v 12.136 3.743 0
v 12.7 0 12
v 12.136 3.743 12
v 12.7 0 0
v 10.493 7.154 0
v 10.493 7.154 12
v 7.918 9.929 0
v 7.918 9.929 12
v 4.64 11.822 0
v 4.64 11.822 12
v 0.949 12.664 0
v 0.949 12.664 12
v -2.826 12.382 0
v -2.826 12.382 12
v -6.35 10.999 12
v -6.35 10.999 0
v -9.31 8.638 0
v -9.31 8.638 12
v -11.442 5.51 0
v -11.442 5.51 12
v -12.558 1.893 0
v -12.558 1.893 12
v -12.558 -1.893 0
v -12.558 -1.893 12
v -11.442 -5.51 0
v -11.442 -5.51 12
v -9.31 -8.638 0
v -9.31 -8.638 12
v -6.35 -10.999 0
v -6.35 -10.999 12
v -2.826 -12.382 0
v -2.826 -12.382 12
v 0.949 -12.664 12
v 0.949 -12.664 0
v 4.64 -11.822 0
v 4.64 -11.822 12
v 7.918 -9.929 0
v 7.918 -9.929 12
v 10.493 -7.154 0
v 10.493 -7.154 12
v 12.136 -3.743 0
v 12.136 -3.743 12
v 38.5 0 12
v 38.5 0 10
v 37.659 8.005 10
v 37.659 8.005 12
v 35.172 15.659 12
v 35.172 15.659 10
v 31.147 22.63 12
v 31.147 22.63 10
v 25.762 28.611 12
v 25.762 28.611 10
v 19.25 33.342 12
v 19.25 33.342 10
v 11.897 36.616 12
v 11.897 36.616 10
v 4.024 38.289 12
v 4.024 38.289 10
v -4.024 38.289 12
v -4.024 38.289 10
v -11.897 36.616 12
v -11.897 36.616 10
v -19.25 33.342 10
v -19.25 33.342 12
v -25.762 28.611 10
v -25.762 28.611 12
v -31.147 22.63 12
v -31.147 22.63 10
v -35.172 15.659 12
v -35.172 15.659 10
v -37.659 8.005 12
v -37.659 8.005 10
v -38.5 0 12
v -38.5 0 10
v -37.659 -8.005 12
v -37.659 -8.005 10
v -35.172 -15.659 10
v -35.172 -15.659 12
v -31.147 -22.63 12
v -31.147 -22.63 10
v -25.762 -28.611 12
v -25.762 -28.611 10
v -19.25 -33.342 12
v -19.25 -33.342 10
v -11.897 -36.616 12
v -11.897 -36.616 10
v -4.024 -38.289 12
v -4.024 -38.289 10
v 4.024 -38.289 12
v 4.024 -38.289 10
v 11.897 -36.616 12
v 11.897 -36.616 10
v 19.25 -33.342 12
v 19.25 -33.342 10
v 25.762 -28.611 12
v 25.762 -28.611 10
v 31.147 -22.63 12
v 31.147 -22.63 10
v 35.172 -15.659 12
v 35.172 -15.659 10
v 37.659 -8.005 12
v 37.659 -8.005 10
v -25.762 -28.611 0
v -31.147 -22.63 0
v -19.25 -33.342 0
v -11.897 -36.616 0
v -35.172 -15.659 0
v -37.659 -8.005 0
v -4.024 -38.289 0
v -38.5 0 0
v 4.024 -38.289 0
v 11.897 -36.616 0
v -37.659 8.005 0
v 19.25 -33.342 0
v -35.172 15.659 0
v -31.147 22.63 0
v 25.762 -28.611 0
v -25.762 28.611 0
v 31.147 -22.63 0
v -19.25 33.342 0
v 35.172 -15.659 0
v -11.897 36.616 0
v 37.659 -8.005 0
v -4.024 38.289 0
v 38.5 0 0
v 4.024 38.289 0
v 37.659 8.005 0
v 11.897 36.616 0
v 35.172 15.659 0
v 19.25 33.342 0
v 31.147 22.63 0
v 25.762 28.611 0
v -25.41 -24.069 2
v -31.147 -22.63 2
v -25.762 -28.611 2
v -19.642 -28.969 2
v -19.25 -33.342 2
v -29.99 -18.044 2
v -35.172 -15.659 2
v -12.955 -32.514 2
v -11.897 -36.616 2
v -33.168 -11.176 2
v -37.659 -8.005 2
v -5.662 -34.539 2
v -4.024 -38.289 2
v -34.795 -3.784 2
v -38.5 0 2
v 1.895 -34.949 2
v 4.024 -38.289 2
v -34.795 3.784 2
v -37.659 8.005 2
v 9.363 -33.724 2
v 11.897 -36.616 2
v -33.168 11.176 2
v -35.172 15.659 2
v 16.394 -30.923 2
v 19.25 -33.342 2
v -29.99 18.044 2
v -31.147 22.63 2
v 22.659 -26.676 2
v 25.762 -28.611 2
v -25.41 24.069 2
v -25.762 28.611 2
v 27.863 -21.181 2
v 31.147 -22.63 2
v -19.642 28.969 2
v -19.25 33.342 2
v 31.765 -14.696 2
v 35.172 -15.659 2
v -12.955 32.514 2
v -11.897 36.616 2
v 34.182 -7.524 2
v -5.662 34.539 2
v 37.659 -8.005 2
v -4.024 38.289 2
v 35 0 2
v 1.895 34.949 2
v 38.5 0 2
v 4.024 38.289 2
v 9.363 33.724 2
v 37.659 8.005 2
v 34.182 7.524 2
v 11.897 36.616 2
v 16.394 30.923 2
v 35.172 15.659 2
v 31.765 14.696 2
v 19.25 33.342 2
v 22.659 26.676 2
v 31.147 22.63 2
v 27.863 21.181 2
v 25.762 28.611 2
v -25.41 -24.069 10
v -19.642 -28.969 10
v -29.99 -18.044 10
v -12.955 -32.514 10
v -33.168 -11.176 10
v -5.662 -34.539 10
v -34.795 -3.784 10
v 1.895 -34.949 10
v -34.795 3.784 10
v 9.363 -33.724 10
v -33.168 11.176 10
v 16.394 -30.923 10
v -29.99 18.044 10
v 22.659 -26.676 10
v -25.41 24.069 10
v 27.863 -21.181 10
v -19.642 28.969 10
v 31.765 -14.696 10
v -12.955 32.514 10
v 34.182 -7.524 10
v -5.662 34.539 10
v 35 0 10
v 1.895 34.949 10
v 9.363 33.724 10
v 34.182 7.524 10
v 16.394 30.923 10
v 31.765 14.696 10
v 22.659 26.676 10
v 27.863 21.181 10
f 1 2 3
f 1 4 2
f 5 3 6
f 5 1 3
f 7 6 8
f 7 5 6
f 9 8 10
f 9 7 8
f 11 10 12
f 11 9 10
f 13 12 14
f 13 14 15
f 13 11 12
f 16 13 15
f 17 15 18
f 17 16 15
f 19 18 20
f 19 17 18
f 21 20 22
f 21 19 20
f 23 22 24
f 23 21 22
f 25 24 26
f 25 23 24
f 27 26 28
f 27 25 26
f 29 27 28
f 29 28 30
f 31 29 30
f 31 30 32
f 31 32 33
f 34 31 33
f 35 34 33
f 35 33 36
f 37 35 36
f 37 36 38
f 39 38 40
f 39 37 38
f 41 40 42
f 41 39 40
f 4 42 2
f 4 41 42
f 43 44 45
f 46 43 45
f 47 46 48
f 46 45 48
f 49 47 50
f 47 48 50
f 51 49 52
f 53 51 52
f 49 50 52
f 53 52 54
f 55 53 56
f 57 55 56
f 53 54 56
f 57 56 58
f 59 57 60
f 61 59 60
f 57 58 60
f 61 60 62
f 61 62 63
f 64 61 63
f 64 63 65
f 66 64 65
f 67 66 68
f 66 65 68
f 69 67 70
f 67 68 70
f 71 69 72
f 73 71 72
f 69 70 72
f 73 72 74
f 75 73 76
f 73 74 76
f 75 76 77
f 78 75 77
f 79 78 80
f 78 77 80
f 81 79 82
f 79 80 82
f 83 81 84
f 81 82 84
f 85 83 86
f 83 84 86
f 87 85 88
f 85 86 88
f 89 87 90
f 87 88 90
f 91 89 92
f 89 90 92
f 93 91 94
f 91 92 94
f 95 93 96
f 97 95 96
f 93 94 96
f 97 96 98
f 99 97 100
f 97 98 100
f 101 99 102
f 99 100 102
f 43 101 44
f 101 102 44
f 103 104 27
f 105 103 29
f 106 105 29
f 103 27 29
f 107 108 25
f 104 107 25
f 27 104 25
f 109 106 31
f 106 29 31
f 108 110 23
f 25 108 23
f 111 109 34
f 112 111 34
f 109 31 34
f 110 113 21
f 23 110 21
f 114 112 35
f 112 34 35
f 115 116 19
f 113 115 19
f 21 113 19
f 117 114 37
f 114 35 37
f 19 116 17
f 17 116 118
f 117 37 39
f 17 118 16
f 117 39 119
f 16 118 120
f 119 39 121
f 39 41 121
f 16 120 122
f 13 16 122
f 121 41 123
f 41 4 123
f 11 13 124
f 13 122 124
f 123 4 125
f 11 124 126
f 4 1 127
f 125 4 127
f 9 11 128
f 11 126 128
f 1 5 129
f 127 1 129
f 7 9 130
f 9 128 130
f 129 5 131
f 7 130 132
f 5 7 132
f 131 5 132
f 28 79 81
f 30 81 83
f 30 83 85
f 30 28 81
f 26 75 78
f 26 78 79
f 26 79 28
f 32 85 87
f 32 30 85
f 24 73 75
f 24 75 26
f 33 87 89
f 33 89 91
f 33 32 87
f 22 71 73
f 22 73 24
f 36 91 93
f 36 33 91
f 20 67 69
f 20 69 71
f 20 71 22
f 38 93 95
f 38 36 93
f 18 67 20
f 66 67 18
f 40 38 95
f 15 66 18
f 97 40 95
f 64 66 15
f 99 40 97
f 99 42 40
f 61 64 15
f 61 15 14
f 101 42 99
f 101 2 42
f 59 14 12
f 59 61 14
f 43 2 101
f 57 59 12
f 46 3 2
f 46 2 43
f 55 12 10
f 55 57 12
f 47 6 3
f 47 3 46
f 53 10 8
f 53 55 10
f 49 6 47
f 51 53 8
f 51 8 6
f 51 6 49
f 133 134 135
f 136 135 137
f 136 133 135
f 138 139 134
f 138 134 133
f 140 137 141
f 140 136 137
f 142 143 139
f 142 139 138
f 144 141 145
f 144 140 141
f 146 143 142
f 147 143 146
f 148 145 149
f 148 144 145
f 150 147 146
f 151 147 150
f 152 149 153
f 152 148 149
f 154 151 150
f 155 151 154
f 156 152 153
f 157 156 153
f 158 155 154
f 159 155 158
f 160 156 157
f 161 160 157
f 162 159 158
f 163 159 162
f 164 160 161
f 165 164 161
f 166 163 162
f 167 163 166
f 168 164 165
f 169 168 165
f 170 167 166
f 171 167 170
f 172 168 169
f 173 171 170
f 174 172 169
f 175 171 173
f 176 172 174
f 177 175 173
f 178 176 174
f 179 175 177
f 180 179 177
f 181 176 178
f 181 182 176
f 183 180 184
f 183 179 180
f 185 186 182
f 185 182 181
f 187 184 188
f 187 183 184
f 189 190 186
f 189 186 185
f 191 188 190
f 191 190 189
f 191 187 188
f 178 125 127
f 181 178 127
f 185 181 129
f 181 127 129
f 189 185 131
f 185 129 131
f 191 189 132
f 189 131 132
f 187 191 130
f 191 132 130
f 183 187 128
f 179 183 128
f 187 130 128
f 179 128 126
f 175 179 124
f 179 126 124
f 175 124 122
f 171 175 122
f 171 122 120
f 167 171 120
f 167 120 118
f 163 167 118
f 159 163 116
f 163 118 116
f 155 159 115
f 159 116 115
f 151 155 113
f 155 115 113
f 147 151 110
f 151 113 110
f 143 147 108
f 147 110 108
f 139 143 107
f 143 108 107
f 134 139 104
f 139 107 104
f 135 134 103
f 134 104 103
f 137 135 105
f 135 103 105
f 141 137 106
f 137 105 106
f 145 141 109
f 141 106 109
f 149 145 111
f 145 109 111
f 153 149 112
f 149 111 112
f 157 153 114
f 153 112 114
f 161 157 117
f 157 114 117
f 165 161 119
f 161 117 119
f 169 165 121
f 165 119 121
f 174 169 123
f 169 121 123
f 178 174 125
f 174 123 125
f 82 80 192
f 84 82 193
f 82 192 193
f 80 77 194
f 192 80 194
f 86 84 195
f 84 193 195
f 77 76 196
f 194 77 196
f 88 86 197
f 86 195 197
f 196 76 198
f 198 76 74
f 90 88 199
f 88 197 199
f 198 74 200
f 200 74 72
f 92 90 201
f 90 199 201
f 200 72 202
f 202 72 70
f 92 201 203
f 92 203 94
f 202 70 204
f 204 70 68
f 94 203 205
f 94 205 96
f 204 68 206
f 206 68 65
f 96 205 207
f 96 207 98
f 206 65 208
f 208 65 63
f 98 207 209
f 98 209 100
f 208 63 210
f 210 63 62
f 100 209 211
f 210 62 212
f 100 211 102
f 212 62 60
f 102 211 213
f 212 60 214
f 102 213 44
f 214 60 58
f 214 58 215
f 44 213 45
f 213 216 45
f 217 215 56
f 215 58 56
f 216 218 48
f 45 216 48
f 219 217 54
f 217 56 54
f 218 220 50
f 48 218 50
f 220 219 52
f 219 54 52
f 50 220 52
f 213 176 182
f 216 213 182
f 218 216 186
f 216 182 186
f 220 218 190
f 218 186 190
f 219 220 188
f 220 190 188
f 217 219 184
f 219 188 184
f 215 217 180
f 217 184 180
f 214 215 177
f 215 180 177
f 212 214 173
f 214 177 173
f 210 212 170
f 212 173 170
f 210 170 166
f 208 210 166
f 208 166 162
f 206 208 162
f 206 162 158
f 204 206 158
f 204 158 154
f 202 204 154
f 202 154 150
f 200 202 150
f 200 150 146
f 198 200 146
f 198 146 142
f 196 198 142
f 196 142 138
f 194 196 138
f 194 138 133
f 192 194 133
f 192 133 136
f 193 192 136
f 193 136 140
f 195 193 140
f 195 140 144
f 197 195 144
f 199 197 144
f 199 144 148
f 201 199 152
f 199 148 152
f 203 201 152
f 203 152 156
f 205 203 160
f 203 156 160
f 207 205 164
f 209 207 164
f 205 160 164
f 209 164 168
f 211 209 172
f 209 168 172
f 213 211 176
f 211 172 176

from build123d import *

# Parameters (mm, degrees)
F0_R     = 38.5
F0_R_2   = 35
F0_R_3   = 12.7
F1_DEPTH = 2
F2_DEPTH = 10
F3_R     = 38.5
F3_R_2   = 35
F3_R_3   = 12.7
F4_DEPTH = 2


with BuildPart() as f1:
    # F0 (on Top) → F1 (new body)
    with BuildSketch(Plane.XY):
        Circle(F0_R)
        Circle(F0_R_2, mode=Mode.SUBTRACT)
        Circle(F0_R_2)
        Circle(F0_R_3, mode=Mode.SUBTRACT)
    extrude(amount=F1_DEPTH)

    # F0 (on Top) → F2 (join)
    with BuildSketch(Plane.XY):
        Circle(F0_R_2)
        Circle(F0_R_3, mode=Mode.SUBTRACT)
    extrude(amount=F2_DEPTH)

    # F3 (on face) → F4 (join)
    with BuildSketch(Plane.XY.offset(10)):
        Circle(F3_R)
        Circle(F3_R_2, mode=Mode.SUBTRACT)
        Circle(F3_R_2)
        Circle(F3_R_3, mode=Mode.SUBTRACT)
    extrude(amount=F4_DEPTH)


solid = f1.part
